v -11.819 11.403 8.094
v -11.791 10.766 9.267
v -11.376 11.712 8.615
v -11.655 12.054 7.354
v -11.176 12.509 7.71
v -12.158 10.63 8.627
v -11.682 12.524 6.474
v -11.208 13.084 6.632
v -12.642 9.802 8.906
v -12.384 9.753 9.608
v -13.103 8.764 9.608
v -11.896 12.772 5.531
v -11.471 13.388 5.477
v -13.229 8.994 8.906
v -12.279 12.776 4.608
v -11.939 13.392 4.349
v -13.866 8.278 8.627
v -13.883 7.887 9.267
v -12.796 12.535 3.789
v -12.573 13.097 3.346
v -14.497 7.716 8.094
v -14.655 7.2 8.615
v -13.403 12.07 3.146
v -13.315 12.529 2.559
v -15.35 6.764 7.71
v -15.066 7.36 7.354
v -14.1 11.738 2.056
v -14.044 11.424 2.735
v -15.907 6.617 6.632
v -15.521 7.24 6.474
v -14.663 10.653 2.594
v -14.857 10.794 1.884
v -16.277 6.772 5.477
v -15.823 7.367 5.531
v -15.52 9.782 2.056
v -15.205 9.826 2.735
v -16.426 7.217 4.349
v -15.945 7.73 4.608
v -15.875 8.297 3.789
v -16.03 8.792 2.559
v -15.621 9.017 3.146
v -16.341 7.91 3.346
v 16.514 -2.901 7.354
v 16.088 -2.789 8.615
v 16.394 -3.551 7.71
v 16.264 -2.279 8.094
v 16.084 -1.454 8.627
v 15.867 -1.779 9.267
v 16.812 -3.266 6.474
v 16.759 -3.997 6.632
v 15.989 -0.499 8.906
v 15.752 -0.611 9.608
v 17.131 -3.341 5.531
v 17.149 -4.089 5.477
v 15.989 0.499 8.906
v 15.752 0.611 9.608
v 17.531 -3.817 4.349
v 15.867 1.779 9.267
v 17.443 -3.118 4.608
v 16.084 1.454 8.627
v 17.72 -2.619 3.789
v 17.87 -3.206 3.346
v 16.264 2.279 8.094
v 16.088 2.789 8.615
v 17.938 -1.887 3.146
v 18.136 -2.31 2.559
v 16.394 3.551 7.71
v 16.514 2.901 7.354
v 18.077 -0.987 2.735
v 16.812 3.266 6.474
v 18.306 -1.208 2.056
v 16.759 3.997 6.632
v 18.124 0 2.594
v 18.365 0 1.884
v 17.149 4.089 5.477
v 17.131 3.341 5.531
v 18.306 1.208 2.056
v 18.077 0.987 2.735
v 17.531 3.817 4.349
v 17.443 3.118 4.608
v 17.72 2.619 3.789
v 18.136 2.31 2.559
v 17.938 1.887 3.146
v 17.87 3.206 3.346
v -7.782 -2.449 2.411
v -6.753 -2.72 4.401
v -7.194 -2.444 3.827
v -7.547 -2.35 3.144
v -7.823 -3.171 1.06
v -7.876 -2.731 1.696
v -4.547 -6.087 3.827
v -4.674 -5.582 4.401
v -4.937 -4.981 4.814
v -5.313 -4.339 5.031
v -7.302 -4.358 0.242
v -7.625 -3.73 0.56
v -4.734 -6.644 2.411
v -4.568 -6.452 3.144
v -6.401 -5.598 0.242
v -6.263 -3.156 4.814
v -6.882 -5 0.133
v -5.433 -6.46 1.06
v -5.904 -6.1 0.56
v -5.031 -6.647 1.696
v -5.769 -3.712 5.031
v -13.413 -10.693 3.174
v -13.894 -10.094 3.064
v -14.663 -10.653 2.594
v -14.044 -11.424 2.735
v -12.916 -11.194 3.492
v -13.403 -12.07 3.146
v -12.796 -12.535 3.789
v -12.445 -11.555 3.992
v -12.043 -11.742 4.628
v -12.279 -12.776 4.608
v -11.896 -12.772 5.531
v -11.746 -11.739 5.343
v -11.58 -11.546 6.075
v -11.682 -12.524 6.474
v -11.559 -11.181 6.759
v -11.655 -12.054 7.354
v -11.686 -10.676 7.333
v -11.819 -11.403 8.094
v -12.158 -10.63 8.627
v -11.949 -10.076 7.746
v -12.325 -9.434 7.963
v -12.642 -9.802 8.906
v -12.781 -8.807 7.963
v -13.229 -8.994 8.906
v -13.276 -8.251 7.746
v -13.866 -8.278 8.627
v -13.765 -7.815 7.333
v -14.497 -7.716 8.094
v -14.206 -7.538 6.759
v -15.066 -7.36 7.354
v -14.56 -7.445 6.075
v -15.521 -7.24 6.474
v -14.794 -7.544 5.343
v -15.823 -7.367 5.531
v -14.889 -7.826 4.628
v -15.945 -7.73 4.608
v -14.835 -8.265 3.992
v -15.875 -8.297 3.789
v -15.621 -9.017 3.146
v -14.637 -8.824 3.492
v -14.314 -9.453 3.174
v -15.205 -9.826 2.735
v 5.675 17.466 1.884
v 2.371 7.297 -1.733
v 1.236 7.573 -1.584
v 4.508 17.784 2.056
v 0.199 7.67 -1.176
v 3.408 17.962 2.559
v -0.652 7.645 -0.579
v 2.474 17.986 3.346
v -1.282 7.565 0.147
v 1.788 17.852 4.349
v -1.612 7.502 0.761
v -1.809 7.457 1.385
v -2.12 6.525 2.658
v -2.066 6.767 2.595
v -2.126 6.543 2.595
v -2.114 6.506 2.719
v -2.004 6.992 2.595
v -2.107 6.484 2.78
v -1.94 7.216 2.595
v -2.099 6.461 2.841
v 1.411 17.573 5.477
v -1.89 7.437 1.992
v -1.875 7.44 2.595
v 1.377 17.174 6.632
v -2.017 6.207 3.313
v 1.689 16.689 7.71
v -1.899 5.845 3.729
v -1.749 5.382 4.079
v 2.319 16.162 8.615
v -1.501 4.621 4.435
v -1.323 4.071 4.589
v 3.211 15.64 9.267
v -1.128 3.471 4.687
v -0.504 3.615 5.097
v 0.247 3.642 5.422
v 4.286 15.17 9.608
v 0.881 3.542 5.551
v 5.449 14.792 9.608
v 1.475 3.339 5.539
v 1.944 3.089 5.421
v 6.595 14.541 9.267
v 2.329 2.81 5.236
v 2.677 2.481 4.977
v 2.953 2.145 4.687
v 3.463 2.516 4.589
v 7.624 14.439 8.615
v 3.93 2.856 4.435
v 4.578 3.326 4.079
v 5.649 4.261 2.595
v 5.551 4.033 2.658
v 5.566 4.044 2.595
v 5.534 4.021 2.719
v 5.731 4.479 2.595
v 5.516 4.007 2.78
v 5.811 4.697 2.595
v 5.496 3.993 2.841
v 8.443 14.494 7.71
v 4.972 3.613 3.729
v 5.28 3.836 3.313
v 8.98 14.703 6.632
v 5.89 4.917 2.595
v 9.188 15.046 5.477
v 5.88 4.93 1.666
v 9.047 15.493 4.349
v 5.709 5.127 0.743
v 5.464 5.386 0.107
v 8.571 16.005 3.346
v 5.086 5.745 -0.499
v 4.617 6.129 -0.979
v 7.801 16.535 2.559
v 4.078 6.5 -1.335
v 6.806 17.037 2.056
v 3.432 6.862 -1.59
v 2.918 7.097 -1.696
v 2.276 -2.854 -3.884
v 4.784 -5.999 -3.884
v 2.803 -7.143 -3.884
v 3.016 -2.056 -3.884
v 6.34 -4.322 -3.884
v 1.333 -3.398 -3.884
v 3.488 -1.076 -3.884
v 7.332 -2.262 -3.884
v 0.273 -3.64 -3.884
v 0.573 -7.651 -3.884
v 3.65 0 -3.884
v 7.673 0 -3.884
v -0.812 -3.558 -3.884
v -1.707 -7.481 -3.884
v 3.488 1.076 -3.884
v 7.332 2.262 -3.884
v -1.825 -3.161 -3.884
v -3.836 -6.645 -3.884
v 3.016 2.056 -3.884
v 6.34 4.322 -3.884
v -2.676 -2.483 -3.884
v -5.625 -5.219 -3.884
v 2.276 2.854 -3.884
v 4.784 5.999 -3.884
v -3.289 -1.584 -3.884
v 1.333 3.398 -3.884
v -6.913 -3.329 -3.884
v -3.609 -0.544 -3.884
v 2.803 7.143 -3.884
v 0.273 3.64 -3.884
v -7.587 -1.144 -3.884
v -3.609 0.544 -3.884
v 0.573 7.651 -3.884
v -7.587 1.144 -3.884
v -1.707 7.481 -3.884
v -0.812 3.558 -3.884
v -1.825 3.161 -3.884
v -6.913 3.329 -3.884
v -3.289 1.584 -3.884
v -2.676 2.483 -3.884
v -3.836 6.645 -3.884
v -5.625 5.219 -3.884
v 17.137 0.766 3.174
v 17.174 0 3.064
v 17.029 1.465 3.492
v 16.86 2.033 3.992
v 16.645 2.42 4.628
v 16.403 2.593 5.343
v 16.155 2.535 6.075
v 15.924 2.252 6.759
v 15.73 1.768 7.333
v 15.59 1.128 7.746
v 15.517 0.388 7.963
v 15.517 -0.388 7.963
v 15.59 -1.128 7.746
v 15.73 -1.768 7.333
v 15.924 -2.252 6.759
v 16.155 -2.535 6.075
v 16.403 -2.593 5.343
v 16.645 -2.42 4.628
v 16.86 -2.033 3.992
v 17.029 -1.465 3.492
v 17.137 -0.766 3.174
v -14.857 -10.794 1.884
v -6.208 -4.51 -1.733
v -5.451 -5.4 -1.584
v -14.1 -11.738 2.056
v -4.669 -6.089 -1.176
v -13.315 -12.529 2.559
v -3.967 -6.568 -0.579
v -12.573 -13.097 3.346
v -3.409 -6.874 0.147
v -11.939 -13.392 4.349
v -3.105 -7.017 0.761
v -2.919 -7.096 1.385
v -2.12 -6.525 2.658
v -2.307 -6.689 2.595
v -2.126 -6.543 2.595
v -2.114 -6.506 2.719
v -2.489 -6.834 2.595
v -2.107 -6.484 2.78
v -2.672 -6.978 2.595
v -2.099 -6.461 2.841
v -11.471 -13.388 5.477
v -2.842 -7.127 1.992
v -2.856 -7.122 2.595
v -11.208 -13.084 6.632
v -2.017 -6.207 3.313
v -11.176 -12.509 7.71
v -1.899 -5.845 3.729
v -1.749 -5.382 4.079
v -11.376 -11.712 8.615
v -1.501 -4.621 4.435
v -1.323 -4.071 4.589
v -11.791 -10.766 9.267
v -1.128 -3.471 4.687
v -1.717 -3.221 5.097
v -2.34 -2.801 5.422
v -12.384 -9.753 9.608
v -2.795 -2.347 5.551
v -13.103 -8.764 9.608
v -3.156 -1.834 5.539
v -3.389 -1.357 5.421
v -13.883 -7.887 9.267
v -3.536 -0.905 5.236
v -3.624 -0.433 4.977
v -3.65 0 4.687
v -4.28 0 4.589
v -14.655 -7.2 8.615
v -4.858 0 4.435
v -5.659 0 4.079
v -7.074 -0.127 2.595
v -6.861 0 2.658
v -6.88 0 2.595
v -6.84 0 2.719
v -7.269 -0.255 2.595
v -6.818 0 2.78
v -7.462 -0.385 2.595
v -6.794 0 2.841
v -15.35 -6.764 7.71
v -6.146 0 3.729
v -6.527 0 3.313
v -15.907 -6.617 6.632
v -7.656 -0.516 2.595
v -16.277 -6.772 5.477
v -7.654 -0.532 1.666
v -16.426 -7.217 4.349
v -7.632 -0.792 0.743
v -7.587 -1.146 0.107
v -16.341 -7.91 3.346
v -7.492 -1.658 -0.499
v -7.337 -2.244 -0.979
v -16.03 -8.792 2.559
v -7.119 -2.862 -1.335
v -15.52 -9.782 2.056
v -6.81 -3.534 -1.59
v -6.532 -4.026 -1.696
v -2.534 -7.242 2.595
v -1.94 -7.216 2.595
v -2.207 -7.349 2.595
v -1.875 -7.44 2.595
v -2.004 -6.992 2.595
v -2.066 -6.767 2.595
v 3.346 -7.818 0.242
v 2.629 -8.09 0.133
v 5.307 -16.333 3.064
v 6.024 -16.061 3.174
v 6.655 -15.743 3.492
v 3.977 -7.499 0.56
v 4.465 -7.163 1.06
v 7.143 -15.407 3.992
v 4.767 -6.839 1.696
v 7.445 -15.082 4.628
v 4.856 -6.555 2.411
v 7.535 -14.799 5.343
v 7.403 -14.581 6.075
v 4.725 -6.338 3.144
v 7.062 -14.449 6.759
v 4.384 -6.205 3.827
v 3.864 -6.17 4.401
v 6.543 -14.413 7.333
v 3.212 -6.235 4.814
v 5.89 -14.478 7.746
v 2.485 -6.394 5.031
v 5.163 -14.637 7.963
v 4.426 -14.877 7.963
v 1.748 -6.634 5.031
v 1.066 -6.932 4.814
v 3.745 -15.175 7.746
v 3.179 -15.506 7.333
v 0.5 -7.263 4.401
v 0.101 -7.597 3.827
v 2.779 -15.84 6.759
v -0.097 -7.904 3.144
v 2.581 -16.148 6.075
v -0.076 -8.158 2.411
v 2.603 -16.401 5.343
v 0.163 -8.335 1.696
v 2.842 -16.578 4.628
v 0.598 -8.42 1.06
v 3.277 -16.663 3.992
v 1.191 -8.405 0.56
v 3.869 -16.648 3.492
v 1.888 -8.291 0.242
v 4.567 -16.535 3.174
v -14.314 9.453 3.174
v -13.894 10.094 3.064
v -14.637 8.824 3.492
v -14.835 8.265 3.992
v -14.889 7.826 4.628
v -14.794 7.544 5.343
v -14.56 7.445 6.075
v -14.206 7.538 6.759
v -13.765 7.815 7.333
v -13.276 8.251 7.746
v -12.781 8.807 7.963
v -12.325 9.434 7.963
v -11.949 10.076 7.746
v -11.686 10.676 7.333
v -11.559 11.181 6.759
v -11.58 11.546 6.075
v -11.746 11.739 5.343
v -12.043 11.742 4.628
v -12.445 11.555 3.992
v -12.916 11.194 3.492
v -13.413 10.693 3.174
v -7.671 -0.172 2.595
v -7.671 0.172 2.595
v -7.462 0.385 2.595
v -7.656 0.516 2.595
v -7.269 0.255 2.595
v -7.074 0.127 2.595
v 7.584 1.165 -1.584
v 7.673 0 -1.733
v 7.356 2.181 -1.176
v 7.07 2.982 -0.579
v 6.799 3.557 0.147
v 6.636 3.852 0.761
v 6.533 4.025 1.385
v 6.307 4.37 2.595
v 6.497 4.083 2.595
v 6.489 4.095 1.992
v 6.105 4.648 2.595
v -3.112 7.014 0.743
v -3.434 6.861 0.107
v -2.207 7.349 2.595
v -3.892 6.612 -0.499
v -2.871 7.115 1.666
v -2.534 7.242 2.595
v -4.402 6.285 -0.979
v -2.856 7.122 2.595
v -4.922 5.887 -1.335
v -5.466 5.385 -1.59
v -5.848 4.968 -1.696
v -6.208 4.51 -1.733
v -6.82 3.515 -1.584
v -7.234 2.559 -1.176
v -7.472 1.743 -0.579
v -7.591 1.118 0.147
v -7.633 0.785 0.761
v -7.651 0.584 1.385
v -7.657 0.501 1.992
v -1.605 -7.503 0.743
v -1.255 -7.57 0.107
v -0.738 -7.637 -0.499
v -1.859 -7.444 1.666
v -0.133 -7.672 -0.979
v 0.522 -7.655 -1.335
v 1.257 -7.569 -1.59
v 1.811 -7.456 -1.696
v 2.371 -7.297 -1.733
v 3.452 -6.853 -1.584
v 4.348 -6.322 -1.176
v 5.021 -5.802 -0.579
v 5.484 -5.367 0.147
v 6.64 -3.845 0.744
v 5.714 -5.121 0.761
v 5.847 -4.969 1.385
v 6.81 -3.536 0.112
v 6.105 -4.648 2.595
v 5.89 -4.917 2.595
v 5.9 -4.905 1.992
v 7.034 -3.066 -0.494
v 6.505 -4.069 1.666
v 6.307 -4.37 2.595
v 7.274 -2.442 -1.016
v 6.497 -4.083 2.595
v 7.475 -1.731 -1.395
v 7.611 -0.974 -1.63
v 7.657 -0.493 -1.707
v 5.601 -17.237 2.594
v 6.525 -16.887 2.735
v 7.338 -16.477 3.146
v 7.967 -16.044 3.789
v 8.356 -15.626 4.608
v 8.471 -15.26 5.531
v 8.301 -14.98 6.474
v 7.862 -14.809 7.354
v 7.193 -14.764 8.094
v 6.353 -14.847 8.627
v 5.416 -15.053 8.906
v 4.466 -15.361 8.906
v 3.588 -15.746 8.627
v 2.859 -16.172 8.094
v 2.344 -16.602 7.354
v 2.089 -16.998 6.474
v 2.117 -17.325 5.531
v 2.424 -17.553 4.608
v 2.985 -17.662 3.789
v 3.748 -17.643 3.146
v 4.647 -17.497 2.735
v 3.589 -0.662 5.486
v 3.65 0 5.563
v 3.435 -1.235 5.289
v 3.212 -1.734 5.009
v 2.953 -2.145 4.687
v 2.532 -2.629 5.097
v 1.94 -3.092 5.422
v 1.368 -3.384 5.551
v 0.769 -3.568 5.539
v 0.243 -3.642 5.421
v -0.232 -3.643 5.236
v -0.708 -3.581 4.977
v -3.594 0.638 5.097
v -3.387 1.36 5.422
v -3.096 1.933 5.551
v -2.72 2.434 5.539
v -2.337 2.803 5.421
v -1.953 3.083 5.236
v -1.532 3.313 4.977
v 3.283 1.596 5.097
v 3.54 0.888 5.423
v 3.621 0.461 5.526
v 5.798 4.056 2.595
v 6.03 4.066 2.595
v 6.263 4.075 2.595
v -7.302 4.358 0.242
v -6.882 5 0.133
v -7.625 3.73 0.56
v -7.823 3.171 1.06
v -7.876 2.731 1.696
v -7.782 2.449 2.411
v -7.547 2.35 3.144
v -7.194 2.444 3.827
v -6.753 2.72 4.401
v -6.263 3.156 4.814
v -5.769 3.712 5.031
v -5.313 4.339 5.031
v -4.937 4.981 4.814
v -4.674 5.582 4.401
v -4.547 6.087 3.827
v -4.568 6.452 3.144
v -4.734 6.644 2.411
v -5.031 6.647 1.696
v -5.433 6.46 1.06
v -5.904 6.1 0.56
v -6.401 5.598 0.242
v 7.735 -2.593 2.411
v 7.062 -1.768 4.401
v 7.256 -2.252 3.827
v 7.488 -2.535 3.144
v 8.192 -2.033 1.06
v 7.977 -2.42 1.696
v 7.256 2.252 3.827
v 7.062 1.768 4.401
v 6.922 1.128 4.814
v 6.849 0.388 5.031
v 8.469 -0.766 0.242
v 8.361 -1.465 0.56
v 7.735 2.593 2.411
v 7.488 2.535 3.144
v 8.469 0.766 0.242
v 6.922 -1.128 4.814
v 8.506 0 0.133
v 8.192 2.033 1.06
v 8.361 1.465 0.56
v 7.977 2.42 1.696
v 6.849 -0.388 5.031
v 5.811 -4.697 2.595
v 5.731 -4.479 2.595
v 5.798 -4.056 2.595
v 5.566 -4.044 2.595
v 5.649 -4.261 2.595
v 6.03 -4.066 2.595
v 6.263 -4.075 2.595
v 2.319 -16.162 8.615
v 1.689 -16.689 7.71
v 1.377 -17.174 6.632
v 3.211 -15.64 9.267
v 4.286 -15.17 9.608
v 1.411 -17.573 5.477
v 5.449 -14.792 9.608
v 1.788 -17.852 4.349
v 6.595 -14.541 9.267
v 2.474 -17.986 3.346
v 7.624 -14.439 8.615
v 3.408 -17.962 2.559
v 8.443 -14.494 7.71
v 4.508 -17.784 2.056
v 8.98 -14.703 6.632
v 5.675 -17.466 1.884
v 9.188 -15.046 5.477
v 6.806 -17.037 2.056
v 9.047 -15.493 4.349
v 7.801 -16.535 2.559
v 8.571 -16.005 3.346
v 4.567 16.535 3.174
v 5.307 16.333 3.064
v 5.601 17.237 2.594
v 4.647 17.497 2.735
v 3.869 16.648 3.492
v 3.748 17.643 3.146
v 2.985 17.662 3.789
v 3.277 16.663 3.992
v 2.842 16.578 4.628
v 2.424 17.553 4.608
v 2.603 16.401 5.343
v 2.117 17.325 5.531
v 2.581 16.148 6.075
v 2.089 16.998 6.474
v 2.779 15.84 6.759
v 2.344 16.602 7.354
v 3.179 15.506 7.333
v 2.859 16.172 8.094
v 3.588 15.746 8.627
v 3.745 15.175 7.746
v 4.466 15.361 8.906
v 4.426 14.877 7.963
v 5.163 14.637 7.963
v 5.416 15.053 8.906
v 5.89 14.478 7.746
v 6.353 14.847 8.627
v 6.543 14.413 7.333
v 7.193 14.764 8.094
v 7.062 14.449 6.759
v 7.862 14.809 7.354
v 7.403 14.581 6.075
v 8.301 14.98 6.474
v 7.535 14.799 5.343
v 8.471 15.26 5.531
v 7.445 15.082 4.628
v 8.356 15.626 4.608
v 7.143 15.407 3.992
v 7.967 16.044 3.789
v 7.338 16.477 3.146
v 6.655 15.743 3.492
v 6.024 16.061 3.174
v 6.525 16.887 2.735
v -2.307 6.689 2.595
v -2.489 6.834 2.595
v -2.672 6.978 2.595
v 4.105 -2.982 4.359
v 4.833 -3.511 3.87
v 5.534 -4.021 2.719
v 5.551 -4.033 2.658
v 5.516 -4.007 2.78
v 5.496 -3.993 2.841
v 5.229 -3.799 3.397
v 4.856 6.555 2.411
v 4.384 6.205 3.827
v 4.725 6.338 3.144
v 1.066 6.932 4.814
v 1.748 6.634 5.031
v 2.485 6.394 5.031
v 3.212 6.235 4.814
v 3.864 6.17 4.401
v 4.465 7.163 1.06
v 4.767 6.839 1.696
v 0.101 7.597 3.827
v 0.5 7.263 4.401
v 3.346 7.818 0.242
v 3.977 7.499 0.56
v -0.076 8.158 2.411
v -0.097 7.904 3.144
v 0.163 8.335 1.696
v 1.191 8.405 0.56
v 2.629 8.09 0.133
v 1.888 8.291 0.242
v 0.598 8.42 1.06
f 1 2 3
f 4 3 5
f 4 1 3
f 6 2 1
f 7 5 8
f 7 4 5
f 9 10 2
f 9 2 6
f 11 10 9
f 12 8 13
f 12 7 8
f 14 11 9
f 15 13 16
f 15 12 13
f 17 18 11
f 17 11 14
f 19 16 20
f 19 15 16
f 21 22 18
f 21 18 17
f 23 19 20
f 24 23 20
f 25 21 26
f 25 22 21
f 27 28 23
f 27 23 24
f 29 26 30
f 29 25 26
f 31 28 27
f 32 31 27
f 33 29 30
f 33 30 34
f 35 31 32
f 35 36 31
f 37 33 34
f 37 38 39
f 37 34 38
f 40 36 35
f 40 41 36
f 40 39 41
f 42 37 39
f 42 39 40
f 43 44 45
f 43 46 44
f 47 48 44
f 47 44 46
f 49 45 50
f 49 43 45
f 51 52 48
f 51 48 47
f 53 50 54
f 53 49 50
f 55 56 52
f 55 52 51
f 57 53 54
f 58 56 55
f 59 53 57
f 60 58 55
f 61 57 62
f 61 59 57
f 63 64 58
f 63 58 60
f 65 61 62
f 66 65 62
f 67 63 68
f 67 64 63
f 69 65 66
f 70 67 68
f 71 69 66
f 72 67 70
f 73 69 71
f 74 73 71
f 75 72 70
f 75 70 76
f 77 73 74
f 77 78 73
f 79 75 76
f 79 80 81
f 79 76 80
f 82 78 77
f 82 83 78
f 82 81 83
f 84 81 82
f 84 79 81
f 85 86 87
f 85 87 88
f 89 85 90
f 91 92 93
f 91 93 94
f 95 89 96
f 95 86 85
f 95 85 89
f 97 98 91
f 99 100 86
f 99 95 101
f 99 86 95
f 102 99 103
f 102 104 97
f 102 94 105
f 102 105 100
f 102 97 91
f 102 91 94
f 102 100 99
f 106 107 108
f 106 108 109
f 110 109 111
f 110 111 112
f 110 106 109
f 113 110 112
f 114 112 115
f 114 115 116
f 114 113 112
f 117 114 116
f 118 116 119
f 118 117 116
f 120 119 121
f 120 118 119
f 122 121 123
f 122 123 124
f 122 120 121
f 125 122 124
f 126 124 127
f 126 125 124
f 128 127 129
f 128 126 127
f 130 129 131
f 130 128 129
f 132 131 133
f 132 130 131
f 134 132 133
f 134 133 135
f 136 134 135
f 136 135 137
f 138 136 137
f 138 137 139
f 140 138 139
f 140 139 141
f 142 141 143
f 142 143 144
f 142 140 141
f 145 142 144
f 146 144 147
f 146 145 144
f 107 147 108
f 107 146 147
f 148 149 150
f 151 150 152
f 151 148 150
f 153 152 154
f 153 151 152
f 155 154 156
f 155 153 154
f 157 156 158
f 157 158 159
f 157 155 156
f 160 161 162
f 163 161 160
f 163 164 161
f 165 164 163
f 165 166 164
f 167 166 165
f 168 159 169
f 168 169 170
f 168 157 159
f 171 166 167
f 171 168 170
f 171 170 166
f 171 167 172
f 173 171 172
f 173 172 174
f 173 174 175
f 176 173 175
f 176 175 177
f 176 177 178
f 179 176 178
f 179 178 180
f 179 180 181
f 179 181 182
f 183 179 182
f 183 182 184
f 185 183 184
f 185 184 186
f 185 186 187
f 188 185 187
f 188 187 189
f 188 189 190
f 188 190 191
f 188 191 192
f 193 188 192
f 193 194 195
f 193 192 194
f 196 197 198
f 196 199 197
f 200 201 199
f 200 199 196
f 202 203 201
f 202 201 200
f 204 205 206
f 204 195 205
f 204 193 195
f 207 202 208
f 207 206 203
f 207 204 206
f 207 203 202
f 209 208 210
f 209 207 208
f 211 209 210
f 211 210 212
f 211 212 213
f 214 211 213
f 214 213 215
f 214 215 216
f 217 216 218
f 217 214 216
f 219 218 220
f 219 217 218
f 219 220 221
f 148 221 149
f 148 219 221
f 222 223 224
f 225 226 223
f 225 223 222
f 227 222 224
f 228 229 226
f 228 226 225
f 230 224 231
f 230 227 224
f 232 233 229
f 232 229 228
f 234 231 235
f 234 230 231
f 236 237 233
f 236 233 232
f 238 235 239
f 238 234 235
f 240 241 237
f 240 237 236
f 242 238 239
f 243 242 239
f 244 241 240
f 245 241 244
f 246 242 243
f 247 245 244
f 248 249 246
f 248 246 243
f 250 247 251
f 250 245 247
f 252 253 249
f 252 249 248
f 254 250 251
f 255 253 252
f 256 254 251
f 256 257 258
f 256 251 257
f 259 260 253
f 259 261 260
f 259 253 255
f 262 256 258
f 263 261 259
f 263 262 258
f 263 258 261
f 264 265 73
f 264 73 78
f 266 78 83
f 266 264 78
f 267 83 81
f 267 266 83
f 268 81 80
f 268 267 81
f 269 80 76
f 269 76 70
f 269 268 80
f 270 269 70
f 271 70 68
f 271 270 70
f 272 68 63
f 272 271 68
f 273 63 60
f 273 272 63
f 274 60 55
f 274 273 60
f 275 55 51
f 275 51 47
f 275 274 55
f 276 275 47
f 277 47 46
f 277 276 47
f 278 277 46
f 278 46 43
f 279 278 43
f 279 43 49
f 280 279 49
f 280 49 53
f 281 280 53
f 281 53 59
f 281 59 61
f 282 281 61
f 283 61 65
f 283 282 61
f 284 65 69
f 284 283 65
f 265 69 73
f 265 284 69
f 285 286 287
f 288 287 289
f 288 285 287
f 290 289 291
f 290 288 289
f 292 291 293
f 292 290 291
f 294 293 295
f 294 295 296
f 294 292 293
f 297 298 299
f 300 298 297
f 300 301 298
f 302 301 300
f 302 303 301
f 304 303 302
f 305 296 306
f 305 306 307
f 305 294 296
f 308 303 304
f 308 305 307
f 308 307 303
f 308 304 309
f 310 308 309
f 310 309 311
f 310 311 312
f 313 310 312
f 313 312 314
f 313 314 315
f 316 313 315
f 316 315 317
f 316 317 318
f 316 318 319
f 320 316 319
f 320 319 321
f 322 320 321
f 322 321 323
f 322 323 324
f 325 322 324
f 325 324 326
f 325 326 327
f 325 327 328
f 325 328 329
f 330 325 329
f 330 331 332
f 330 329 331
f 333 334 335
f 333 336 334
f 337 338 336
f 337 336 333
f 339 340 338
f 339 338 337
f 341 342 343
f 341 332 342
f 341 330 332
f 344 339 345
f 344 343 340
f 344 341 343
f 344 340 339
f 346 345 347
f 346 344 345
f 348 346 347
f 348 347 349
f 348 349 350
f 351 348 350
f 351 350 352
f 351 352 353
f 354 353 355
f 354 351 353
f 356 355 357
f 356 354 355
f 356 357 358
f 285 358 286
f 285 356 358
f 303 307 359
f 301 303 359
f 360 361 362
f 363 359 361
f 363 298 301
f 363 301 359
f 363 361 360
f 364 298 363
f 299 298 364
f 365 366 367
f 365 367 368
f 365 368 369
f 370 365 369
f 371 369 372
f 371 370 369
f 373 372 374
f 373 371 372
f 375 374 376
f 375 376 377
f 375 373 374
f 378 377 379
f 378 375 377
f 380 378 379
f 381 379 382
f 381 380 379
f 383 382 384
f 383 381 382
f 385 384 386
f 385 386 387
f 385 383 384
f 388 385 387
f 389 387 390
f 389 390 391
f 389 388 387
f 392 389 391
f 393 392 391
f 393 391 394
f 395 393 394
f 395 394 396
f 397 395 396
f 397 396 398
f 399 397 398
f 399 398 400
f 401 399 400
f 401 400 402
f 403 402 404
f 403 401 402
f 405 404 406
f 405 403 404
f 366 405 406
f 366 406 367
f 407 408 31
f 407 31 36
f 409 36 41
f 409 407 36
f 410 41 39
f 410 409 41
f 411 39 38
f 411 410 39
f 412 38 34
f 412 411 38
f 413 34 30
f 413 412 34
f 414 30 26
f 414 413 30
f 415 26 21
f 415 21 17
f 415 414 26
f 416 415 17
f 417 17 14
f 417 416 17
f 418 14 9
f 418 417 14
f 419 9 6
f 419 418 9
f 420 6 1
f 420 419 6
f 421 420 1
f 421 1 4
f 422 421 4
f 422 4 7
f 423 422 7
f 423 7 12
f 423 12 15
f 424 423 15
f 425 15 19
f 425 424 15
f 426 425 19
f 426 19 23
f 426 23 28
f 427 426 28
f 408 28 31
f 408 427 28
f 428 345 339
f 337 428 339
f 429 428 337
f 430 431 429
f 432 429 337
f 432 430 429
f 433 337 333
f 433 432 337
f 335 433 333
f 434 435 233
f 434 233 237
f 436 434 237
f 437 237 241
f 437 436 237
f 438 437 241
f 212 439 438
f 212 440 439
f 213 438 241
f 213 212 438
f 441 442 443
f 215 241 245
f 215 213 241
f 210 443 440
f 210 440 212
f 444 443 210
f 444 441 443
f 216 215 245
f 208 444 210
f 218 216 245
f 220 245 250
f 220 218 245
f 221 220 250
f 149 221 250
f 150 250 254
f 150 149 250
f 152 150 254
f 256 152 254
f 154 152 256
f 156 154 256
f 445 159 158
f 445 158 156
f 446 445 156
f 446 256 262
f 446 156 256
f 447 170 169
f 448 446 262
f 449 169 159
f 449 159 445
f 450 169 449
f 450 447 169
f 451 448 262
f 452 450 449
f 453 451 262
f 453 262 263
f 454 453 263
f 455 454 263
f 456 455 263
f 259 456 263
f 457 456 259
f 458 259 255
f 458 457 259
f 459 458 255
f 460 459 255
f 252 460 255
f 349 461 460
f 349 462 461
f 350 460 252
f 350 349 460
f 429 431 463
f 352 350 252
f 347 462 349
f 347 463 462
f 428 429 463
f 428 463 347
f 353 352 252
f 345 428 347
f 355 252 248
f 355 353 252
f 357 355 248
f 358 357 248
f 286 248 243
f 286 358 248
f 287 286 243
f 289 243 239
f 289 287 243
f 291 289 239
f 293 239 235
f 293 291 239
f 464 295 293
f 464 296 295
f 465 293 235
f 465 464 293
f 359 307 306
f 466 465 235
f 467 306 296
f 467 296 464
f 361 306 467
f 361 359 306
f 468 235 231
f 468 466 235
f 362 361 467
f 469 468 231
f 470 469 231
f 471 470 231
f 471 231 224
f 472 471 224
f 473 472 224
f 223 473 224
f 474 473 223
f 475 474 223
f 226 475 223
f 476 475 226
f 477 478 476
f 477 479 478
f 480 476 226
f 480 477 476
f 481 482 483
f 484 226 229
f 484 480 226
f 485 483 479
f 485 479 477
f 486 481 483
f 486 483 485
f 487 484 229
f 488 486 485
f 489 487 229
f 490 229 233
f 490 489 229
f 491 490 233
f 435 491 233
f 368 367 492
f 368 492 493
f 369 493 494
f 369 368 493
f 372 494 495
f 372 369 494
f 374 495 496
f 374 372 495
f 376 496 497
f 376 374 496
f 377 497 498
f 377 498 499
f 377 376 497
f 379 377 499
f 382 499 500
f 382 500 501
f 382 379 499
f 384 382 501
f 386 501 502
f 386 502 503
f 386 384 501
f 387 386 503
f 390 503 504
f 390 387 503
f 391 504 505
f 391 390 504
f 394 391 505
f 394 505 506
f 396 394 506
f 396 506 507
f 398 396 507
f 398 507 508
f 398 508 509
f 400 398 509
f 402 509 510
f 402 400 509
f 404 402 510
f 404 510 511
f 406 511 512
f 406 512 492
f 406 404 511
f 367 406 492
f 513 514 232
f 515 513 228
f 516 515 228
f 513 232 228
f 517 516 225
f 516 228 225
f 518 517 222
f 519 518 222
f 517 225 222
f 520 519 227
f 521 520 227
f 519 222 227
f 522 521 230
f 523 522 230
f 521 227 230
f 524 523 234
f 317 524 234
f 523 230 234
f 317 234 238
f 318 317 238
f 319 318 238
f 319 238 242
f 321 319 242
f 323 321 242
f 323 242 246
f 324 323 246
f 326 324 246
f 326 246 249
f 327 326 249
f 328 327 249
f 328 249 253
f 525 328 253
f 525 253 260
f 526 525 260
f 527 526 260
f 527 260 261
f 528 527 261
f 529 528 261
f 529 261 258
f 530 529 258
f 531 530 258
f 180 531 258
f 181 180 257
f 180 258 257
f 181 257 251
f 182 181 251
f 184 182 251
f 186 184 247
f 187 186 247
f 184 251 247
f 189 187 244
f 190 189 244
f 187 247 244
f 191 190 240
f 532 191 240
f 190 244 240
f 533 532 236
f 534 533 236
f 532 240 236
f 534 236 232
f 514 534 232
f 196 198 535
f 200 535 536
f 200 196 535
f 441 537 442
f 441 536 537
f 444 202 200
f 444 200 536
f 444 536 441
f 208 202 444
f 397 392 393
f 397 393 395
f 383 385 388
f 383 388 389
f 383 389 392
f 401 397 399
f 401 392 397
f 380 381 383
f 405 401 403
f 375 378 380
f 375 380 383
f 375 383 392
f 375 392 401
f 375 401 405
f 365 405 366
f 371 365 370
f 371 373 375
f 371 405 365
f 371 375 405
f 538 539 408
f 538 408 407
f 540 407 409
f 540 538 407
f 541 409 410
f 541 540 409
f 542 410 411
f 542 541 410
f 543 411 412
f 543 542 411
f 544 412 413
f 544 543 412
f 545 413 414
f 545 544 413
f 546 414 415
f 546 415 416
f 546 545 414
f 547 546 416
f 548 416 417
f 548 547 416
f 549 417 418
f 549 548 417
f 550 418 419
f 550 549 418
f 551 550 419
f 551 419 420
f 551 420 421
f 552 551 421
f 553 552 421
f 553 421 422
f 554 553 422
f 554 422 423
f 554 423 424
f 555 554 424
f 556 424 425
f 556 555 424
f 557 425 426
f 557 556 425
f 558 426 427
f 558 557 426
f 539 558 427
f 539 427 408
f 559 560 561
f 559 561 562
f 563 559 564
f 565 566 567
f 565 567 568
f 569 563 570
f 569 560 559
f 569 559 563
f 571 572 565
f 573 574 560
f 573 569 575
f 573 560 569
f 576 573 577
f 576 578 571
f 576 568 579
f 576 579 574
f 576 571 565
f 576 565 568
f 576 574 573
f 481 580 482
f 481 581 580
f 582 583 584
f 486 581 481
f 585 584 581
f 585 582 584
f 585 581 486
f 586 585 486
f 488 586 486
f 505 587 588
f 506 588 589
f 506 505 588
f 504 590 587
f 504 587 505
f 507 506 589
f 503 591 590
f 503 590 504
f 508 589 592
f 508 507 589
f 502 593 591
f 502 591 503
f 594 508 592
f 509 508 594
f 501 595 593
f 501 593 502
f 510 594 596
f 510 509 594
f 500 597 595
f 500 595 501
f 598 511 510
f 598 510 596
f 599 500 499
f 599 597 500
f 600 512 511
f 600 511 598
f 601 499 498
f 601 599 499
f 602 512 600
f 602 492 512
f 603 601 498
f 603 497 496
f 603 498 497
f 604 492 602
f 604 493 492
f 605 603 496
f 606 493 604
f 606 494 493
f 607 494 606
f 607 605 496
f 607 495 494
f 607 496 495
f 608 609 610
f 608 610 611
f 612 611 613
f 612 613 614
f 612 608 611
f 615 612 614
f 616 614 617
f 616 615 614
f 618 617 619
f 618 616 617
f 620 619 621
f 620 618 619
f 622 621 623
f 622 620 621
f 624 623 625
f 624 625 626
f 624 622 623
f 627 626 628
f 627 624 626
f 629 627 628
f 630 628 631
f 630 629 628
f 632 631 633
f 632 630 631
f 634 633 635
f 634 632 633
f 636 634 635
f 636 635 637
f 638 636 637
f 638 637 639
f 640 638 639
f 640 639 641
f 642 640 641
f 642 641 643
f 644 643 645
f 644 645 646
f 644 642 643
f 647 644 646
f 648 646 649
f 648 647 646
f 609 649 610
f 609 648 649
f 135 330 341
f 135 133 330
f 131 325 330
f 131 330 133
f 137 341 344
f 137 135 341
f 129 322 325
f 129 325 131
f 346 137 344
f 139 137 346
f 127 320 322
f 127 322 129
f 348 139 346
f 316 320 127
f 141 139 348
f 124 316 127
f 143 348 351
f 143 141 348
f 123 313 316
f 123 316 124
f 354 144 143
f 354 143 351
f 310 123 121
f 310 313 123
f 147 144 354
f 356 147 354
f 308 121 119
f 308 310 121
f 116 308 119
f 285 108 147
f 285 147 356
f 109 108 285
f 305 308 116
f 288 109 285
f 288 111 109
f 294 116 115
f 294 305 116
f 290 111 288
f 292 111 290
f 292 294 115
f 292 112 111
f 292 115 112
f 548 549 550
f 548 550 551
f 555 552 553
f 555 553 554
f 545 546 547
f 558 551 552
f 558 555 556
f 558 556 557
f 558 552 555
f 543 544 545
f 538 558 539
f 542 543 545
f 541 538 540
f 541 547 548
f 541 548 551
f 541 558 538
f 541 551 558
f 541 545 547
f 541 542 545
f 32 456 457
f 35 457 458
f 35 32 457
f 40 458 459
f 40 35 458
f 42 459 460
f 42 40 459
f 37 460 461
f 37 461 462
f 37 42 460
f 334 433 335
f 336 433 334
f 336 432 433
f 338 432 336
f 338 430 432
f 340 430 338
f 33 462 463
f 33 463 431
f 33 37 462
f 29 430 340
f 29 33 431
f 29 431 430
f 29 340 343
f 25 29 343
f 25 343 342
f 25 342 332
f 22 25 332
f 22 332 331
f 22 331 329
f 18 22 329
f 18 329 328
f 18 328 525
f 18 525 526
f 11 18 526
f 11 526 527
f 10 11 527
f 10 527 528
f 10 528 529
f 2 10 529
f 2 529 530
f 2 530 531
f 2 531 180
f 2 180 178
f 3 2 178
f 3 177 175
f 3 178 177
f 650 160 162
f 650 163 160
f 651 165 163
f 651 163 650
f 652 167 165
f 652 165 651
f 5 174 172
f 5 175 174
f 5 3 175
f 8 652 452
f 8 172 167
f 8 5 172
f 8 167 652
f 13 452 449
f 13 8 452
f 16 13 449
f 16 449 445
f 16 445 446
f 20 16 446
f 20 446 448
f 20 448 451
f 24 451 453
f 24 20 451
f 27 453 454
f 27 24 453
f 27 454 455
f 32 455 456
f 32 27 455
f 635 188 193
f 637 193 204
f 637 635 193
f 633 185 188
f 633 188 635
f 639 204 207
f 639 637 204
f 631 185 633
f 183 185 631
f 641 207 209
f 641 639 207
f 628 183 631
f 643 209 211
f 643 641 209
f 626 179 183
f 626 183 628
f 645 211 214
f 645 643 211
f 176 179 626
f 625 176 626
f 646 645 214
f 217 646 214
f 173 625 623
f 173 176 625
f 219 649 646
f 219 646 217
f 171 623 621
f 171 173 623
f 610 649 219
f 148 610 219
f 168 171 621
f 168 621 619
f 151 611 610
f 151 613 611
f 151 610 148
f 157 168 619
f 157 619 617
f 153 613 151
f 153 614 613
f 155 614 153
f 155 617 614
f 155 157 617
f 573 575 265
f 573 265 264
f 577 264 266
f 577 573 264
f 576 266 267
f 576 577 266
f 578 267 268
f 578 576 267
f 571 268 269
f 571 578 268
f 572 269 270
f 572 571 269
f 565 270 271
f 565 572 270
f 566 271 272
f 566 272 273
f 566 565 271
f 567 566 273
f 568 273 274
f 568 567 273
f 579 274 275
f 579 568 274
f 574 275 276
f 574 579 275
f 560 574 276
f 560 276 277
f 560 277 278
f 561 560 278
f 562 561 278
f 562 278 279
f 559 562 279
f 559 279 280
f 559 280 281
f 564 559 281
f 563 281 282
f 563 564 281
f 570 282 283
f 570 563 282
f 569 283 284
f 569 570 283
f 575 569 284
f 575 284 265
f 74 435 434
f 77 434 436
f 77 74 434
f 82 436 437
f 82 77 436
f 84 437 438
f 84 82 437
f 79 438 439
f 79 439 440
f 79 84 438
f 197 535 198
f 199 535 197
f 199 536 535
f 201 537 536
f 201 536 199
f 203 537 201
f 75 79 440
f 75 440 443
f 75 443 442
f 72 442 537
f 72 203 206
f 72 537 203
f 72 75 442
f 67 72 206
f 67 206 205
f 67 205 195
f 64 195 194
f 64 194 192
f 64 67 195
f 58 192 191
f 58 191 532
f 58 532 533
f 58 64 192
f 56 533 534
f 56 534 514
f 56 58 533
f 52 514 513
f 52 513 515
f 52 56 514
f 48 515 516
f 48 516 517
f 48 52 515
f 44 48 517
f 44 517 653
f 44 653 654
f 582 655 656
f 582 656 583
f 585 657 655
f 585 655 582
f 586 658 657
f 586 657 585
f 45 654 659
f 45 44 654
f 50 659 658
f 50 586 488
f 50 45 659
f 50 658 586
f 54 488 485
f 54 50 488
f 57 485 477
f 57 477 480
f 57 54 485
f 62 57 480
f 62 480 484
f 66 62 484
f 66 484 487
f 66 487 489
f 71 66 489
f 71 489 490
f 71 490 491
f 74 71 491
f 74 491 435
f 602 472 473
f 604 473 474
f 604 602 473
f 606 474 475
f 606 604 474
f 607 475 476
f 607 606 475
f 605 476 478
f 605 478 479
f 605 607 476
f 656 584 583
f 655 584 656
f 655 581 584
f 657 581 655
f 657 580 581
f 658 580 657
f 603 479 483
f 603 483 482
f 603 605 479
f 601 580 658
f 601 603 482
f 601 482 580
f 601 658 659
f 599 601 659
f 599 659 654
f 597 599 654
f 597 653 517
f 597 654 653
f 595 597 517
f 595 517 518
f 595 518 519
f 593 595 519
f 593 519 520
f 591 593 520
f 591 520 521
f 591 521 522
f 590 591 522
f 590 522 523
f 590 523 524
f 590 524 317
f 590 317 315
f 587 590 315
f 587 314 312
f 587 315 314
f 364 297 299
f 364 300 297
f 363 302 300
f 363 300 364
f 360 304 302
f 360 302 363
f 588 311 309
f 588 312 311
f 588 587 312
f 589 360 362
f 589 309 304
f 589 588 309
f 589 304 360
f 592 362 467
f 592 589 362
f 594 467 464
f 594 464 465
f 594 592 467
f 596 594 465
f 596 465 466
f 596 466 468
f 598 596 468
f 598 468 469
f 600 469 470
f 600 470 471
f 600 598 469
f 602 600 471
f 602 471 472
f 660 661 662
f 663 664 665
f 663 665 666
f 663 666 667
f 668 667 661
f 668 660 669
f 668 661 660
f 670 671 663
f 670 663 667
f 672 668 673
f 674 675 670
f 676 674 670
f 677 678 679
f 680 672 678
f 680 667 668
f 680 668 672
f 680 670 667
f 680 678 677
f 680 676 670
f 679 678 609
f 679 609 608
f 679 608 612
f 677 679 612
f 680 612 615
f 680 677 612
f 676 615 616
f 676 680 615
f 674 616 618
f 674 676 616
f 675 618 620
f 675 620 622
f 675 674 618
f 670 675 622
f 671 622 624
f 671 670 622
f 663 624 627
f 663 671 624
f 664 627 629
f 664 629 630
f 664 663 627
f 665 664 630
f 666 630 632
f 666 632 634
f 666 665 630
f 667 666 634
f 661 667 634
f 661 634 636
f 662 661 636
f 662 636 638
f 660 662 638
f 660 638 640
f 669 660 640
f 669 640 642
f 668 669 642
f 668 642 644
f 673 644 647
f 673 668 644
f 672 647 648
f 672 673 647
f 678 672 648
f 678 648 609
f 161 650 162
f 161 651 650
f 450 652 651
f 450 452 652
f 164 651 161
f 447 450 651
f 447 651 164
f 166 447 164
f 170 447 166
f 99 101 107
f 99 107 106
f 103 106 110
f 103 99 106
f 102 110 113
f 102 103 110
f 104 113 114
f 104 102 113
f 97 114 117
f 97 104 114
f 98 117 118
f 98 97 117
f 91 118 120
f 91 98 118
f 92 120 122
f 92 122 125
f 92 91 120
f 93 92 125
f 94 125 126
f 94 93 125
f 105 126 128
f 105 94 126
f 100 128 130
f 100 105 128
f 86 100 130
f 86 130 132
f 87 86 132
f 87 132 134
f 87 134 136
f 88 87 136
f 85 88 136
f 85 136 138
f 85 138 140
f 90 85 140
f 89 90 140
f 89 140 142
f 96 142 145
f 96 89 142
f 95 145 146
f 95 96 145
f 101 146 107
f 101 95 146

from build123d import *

# Parameters (mm, degrees)
F3_COUNT = 5
F5_R     = 3.65
F6_DEPTH = 13.536313851
F7_SIZE  = 0.75


with BuildPart() as f2:
    # F1 (on Front) → F2 (revolve)
    with BuildSketch(Plane.XZ):
        Polygon((8.5060233307, 0.1325409275), (7.6729152797, 2.595452005), (7.6729152797, -1.7327594752), (18.364670155, 1.8838498077), (17.8840308948, 3.3047600447), align=None)
        Polygon((7.6729152797, 2.595452005), (0, 0), (1.3137473112, -3.8838213144), (7.6729152797, -1.7327594752), align=None)
    revolve(axis=Axis((8.5254614219, 0, 2.8838355611), (0.9472734913, 0, 0.3204261735)))

    # F3: F2 ×5 about axis
    f3_axis = Axis((0, 0, 20.6734314561), (0, 0, 1))


with BuildPart() as f2_1:
    add(f2.part)
    for i in range(1, F3_COUNT):
        add(f2.part.rotate(f3_axis, i * 360 / F3_COUNT))

    # F1 (on Front) → F4 (revolve)
    with BuildSketch(Plane.XZ):
        Polygon((1.3137473112, -3.8838213144), (0, 0), (0, -3.8838213144), align=None)
        Polygon((7.6729152797, 2.595452005), (0, 0), (1.3137473112, -3.8838213144), (7.6729152797, -1.7327594752), align=None)
        Polygon((7.6729152797, -1.7327594752), (1.3137473112, -3.8838213144), (7.6729152797, -3.8838213144), align=None)
        Polygon((0, 2.595452005), (0, 0), (7.6729152797, 2.595452005), align=None)
    revolve(axis=Axis((0, 0, 20.6734314561), (0, 0, 1)))

    # F5 (on face) → F6 (cut, through all)
    with BuildSketch(Plane(origin=(0, 0, -3.8838213144), x_dir=(1, 0, 0), z_dir=(0, 0, -1))):
        Circle(F5_R)
    extrude(amount=-F6_DEPTH, mode=Mode.SUBTRACT)

    # F7
    f7_edges = [f2_1.edges().sort_by_distance(p)[0] for p in [
        (-13.120488, -9.532592, 8.230582),
        (5.01158, -15.424058, 8.230582),
        (16.217815, 0, 8.230582),
        (5.01158, 15.424058, 8.230582),
        (-13.120488, 9.532592, 8.230582),
    ]]
    chamfer(f7_edges, length=F7_SIZE)


solid = f2_1.part
